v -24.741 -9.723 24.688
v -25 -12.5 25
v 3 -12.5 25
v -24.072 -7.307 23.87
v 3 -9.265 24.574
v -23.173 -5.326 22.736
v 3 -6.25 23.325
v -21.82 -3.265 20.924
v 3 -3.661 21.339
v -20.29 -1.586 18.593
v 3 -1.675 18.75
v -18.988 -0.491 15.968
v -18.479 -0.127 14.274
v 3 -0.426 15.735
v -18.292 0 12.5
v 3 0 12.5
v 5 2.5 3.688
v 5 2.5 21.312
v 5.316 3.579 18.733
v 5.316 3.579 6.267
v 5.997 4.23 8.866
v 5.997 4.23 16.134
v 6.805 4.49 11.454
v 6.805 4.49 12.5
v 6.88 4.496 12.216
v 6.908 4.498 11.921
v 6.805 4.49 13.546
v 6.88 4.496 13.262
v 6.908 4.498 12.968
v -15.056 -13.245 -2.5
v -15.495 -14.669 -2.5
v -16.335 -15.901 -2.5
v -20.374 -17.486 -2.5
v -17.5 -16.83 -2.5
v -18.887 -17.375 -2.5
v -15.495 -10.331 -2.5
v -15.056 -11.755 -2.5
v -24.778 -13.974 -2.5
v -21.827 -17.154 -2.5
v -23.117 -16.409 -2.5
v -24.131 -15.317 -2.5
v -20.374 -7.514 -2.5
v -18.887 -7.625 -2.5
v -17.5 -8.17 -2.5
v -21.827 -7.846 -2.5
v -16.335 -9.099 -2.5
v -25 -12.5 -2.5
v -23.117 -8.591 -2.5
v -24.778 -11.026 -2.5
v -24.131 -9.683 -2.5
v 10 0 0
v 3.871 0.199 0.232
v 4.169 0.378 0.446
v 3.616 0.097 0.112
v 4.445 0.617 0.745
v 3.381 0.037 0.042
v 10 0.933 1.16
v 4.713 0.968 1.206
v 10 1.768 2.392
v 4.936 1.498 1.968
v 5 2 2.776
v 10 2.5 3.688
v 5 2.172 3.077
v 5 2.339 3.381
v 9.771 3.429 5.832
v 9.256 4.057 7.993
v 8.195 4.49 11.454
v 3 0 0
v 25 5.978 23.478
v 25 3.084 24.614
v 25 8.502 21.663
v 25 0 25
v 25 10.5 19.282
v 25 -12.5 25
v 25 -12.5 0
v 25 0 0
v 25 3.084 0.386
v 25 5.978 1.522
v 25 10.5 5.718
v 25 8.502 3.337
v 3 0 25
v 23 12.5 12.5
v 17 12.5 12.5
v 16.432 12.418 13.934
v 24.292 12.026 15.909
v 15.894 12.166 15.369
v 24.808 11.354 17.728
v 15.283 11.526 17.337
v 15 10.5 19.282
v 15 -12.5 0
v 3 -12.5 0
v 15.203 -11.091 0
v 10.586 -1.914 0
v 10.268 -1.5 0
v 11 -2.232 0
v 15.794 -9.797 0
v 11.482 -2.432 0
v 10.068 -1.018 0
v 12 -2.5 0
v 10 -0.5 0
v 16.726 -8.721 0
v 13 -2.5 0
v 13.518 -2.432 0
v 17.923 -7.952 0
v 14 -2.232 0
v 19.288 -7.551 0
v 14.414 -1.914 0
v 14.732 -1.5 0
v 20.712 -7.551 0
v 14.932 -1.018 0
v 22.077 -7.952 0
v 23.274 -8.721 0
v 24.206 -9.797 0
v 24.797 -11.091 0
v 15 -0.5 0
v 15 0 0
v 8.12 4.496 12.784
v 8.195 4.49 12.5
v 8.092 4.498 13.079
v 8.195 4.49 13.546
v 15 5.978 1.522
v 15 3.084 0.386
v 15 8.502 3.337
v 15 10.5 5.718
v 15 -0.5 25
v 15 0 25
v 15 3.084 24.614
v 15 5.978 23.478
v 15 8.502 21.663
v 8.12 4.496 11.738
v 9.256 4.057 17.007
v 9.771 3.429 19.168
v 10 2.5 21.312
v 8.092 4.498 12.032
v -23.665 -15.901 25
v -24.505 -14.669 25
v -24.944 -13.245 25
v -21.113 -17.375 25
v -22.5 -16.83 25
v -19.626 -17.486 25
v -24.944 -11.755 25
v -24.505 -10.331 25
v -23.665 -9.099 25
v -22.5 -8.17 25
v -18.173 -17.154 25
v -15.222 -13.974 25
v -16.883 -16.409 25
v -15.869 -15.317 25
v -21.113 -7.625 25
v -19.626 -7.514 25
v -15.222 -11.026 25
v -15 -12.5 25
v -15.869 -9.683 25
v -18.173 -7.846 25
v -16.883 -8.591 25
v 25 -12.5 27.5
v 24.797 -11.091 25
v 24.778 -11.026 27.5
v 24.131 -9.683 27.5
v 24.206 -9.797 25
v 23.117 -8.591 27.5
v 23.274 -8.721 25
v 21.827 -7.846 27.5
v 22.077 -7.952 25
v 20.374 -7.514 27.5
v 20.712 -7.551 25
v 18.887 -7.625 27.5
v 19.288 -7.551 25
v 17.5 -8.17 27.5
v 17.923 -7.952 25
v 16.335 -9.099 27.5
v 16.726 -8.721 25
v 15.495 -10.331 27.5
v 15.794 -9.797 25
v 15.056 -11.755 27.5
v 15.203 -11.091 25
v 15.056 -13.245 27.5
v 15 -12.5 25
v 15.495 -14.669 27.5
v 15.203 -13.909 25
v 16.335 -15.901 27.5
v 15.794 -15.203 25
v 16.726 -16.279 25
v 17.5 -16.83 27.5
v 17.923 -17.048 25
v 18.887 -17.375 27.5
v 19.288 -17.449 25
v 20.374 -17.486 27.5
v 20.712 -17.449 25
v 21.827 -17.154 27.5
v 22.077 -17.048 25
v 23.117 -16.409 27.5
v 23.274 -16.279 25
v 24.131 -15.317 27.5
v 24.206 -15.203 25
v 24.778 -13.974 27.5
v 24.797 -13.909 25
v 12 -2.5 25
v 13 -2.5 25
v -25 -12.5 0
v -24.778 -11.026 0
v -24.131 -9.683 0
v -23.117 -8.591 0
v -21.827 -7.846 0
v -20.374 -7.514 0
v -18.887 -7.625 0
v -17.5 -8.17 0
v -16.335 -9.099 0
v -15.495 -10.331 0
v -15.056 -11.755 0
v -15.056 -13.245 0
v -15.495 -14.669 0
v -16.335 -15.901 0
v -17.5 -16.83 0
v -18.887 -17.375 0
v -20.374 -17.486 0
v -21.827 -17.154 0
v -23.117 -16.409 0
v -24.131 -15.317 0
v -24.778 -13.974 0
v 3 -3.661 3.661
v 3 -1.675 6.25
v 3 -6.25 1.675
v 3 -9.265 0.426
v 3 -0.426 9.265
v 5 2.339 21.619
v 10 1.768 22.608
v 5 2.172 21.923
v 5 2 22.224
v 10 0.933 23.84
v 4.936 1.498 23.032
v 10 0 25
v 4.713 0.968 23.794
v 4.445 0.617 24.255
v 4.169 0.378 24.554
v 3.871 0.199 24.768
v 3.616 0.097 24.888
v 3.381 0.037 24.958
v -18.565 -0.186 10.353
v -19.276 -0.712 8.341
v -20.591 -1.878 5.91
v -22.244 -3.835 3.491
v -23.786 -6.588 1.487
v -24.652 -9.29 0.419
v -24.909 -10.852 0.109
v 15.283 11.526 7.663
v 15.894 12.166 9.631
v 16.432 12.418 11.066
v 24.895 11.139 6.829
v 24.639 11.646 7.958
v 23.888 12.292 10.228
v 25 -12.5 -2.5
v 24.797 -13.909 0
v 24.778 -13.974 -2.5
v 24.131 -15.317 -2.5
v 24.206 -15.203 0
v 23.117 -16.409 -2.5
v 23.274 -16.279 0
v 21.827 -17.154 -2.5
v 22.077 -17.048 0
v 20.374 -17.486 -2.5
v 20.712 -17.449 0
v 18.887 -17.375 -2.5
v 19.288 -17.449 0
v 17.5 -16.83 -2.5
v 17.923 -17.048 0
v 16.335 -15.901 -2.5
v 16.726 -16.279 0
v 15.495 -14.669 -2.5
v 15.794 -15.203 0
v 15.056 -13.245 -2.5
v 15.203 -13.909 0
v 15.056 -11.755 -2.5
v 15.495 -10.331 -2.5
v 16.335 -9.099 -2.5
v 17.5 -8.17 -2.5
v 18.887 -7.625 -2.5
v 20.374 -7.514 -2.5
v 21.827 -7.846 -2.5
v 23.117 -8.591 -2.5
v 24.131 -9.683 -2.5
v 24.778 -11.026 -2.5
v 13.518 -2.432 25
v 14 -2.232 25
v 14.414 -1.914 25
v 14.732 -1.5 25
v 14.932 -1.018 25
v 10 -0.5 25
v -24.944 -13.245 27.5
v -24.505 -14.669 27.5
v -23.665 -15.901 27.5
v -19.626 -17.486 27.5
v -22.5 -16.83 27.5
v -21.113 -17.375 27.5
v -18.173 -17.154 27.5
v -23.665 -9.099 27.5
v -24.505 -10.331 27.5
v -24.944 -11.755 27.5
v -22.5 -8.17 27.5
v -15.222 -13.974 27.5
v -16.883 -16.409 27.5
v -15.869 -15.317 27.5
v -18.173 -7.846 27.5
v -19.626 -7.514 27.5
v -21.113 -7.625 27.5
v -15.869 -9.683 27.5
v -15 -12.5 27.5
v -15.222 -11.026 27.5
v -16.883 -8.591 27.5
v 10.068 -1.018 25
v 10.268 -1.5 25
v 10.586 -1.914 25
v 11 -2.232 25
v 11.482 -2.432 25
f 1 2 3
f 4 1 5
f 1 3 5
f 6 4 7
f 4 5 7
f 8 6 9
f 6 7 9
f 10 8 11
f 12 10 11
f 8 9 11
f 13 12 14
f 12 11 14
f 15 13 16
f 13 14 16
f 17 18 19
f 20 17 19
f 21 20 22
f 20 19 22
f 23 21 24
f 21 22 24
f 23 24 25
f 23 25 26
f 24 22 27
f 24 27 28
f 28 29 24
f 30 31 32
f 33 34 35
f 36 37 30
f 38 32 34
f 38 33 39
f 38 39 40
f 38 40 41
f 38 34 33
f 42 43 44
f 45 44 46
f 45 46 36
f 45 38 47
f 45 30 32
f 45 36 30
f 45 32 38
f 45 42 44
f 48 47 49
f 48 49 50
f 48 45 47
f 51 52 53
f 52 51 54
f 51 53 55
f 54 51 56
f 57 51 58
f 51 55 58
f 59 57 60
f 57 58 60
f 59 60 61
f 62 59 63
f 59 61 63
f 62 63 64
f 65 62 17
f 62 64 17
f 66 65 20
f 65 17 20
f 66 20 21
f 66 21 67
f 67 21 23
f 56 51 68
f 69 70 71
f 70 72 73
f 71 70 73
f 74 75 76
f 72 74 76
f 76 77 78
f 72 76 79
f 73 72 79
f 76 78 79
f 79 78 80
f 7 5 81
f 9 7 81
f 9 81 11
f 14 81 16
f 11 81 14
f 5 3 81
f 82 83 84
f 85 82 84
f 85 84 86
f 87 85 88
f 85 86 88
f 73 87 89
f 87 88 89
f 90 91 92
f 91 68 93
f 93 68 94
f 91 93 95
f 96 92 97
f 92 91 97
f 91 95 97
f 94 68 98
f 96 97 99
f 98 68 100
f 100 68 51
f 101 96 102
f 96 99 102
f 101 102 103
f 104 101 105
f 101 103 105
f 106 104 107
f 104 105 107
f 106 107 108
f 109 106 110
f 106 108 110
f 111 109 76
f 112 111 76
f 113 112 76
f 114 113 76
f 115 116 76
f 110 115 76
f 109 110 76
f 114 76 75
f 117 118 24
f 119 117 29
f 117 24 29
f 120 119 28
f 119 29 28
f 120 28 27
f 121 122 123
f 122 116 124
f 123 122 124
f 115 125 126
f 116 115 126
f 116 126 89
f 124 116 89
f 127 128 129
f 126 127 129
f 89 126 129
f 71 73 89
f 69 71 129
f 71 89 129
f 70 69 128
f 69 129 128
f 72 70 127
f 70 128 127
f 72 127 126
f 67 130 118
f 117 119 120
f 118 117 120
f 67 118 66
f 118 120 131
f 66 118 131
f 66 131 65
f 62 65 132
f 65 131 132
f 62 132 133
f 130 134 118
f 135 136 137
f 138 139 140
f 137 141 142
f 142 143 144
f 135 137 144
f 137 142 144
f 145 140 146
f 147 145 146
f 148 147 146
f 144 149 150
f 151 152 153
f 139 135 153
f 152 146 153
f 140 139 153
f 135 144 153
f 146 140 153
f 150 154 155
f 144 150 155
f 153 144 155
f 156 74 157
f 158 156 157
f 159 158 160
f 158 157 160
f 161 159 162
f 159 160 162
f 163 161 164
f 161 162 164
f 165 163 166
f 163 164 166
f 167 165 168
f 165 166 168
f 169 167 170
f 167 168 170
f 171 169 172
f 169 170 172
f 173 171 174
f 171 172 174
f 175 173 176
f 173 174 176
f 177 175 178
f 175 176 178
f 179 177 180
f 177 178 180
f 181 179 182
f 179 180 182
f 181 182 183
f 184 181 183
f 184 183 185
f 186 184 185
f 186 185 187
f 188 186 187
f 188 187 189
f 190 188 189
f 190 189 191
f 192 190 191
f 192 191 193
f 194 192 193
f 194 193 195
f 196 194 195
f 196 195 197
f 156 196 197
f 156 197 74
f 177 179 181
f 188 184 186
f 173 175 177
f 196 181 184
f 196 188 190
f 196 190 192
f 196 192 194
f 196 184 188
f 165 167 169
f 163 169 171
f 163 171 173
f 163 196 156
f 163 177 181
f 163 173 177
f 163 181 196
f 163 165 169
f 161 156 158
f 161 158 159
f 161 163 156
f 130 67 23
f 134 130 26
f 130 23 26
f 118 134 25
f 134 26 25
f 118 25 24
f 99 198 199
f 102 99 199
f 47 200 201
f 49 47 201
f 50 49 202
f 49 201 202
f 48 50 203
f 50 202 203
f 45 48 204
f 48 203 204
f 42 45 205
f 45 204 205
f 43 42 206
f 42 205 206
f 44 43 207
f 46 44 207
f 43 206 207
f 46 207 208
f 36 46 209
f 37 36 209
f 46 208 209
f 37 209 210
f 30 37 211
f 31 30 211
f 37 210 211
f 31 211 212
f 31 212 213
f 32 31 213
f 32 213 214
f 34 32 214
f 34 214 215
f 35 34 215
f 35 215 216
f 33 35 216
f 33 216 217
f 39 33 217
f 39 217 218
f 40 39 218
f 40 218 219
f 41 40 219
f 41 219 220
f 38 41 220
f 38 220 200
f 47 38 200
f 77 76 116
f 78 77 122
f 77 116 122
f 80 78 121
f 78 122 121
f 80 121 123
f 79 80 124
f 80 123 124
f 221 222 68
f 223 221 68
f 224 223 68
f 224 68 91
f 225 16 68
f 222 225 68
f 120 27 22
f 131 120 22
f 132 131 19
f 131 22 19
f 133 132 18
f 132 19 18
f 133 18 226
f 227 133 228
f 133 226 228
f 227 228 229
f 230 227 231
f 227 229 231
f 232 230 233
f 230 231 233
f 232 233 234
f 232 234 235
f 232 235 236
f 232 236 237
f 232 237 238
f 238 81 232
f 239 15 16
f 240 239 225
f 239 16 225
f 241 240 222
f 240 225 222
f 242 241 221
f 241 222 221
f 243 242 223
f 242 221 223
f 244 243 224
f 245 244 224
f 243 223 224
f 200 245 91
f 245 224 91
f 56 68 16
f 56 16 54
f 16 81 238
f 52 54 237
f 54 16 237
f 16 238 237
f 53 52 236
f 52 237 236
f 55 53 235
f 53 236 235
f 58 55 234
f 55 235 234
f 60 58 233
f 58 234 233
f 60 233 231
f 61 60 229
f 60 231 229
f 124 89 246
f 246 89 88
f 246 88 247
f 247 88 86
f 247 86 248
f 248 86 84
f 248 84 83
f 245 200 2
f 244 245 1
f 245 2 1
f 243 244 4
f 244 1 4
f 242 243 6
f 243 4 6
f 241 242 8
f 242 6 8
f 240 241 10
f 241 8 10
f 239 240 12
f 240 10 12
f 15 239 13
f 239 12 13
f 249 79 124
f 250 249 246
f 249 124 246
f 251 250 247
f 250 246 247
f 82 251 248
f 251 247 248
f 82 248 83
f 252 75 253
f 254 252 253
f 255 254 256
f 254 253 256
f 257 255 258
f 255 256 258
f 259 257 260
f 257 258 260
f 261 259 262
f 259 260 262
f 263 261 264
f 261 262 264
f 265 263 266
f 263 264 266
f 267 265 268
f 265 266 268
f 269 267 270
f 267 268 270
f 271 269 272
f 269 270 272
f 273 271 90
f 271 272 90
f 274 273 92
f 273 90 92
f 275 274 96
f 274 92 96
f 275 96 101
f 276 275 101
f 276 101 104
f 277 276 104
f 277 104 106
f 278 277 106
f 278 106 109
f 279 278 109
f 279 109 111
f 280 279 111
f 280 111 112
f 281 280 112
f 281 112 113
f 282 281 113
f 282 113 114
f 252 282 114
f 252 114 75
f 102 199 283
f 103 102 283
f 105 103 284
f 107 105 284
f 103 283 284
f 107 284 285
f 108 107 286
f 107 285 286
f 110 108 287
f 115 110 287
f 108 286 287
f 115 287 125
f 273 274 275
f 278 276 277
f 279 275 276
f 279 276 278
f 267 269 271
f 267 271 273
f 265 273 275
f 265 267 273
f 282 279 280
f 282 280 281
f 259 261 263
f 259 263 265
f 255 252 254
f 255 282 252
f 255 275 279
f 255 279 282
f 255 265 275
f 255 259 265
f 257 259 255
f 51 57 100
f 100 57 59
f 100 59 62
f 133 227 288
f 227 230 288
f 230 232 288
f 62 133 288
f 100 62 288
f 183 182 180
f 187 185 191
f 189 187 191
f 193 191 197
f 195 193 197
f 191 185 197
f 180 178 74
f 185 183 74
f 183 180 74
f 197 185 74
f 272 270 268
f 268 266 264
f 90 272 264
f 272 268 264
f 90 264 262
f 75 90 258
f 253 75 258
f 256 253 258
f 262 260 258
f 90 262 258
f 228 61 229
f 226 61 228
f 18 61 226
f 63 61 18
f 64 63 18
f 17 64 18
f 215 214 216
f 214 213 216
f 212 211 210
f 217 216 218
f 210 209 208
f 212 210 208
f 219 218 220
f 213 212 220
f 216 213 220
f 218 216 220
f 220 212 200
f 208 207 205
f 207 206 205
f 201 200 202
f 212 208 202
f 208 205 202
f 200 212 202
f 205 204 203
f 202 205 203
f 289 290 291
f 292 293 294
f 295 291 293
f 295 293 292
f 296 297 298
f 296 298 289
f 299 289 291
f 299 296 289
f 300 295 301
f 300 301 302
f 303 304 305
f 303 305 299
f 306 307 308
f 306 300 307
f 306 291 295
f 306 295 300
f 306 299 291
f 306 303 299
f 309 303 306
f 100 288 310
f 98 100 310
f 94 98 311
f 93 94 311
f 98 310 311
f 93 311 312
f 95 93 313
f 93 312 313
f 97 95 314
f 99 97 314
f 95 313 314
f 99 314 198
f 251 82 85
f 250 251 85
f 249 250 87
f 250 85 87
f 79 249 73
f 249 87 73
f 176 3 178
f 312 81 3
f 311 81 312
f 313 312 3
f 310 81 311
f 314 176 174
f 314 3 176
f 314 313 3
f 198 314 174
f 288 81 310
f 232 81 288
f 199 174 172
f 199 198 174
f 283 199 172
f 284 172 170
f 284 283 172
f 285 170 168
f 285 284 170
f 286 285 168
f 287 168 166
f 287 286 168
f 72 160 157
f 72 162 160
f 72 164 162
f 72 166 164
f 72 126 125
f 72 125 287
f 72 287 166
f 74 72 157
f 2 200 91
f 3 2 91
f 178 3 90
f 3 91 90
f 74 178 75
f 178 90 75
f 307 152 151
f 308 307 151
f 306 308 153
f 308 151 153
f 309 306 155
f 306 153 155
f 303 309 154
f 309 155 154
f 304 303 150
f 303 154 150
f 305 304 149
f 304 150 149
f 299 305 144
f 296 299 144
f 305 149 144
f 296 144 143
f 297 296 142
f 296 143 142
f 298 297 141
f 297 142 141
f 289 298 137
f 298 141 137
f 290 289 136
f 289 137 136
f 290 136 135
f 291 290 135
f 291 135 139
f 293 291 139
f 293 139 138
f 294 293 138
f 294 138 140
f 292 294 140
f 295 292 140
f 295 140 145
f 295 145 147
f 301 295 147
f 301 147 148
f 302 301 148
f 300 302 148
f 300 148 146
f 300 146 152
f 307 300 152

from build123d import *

# Parameters (mm, degrees)
SKETCH1_W               = 50
SKETCH1_H               = 25
BOSS_EXTRUDE1_DEPTH     = 25
CUT_EXTRUDE2_DEPTH      = 25
CUT_EXTRUDE3_DEPTH      = 49.79805324
CUT_EXTRUDE3_DEPTH_BACK = 49.79805324
CUT_EXTRUDE5_DEPTH      = 3
CUT_EXTRUDE5_DEPTH_BACK = 28
CUT_EXTRUDE9_DEPTH      = 7
SKETCH9_R               = 5
BOSS_EXTRUDE2_DEPTH     = 2.5
SKETCH10_R              = 5
BOSS_EXTRUDE3_DEPTH     = 2.5


with BuildPart() as part:
    # Sketch1 → Boss-Extrude1 (new body)
    with BuildSketch(Plane.XY):
        Rectangle(SKETCH1_W, SKETCH1_H)
    extrude(amount=BOSS_EXTRUDE1_DEPTH)

    # Sketch2 → Cut-Extrude2 (cut)
    with BuildSketch(Plane.XY.offset(25)):
        with BuildLine():
            Line((-25, 12.5), (-25, -12.5))
            ThreePointArc((-25, -12.5), (-23.216910184, -5.406814173), (-18.291561976, 0))
            Line((-18.291561976, 0), (3, 0))
            ThreePointArc((3, 0), (4.414213562, 0.585786438), (5, 2))
            Line((5, 2), (5, 2.5))
            ThreePointArc((5, 2.5), (5.585786438, 3.914213562), (7, 4.5))
            Line((7, 4.5), (8, 4.5))
            ThreePointArc((8, 4.5), (9.414213562, 3.914213562), (10, 2.5))
            Line((10, 2.5), (10, -0.5))
            ThreePointArc((10, -0.5), (10.585786438, -1.914213562), (12, -2.5))
            Line((12, -2.5), (13, -2.5))
            ThreePointArc((13, -2.5), (14.414213562, -1.914213562), (15, -0.5))
            Line((15, -0.5), (15, 10.5))
            ThreePointArc((15, 10.5), (15.585786438, 11.914213562), (17, 12.5))
            Line((17, 12.5), (-25, 12.5))
        make_face()
        with BuildLine():
            Line((25, 12.5), (23, 12.5))
            ThreePointArc((23, 12.5), (24.414213562, 11.914213562), (25, 10.5))
            Line((25, 10.5), (25, 12.5))
        make_face()
    extrude(amount=-CUT_EXTRUDE2_DEPTH, mode=Mode.SUBTRACT)

    # Sketch5 → Cut-Extrude3 (cut, two sides)
    with BuildSketch(Plane.ZY.offset(-15)) as cut_extrude3_sk:
        with BuildLine():
            Line((0, 12.5), (0, 10.5))
            Line((0, 10.5), (5.717670017, 10.5))
            ThreePointArc((5.717670017, 10.5), (8.964466094, 11.989578808), (12.5, 12.5))
            Line((12.5, 12.5), (0, 12.5))
        make_face()
        with BuildLine():
            Line((0, 10.5), (0, 0))
            ThreePointArc((0, 0), (1.522087521, 5.977912479), (5.717670017, 10.5))
            Line((5.717670017, 10.5), (0, 10.5))
        make_face()
        with BuildLine():
            ThreePointArc((19.282329983, 10.5), (23.477912479, 5.977912479), (25, 0))
            Line((25, 0), (25, 10.5))
            Line((25, 10.5), (19.282329983, 10.5))
        make_face()
        with BuildLine():
            Line((19.282329983, 10.5), (25, 10.5))
            Line((25, 10.5), (25, 12.5))
            Line((25, 12.5), (12.5, 12.5))
            ThreePointArc((12.5, 12.5), (16.035533906, 11.989578808), (19.282329983, 10.5))
        make_face()
    extrude(amount=CUT_EXTRUDE3_DEPTH, mode=Mode.SUBTRACT)
    extrude(cut_extrude3_sk.sketch, amount=-CUT_EXTRUDE3_DEPTH_BACK, mode=Mode.SUBTRACT)

    # Sketch7 → Cut-Extrude5 (cut, two sides)
    with BuildSketch(Plane(origin=(0, 0, 0), x_dir=(0, 0, -1), z_dir=(1, 0, 0))) as cut_extrude5_sk:
        with BuildLine():
            ThreePointArc((-25, -12.5), (-21.338834788, -3.661165258), (-12.500000066, 0))
            Line((-12.500000066, 0), (-25, 0))
            Line((-25, 0), (-25, -12.5))
        make_face()
        with BuildLine():
            ThreePointArc((-12.500000066, 0), (-3.661165258, -3.661165212), (0, -12.5))
            Line((0, -12.5), (0, 0))
            Line((0, 0), (-12.500000066, 0))
        make_face()
    extrude(amount=CUT_EXTRUDE5_DEPTH, mode=Mode.SUBTRACT)
    extrude(cut_extrude5_sk.sketch, amount=-CUT_EXTRUDE5_DEPTH_BACK, mode=Mode.SUBTRACT)

    # Sketch8 → Cut-Extrude9 (cut)
    with BuildSketch(Plane.ZY.offset(-3)):
        with BuildLine():
            Line((0, 6.612766069), (0, 4.490426703))
            Line((0, 4.490426703), (11.453744839, 4.490426703))
            ThreePointArc((11.453744839, 4.490426703), (11.97687242, 4.497948677), (12.5, 4.490426703))
            Line((12.5, 4.490426703), (12.5, 6.612766069))
            Line((12.5, 6.612766069), (0, 6.612766069))
        make_face()
        with BuildLine():
            Line((0, 4.490426703), (0, 0))
            ThreePointArc((0, 0), (5.335827096, 3.24265383), (11.453744839, 4.490426703))
            Line((11.453744839, 4.490426703), (0, 4.490426703))
        make_face()
        with BuildLine():
            Line((12.5, 6.612766069), (12.5, 4.490426703))
            ThreePointArc((12.5, 4.490426703), (13.02312758, 4.497948677), (13.546255161, 4.490426703))
            Line((13.546255161, 4.490426703), (25, 4.490426703))
            Line((25, 4.490426703), (25, 6.612766069))
            Line((25, 6.612766069), (12.5, 6.612766069))
        make_face()
        with BuildLine():
            ThreePointArc((13.546255161, 4.490426703), (19.664172904, 3.24265383), (25, 0))
            Line((25, 0), (25, 4.490426703))
            Line((25, 4.490426703), (13.546255161, 4.490426703))
        make_face()
    extrude(amount=-CUT_EXTRUDE9_DEPTH, mode=Mode.SUBTRACT)

    # Sketch9 → Boss-Extrude2 (add)
    with BuildSketch(Plane.XY.offset(25)):
        with Locations((-20, -12.5)):
            Circle(SKETCH9_R)
        with Locations((20, -12.5)):
            Circle(SKETCH9_R)
    extrude(amount=BOSS_EXTRUDE2_DEPTH)


with BuildPart() as boss_extrude2_piece_1:
    # of the separate pieces the step leaves, piece 1, a body of its own (boss_extrude2_pieces)
    add(part.part.solids().sort_by_distance((15, 10.5, 5.717670017))[0])

    # Sketch10 → Boss-Extrude3 (add)
    with BuildSketch(Plane(origin=(0, 0, 0), x_dir=(-1, 0, 0), z_dir=(0, 0, -1))):
        with Locations(Location((-20, -12.5, 0), (0, 0, 180))):
            Circle(SKETCH10_R)
        with Locations((20, -12.5)):
            Circle(SKETCH10_R)
    extrude(amount=BOSS_EXTRUDE3_DEPTH)


with BuildPart() as boss_extrude2_piece_2:
    # of the separate pieces the step leaves, piece 2, a body of its own (boss_extrude2_pieces)
    add(part.part.solids().sort_by_distance((-15, -12.5, 27.5))[0])


with BuildPart() as boss_extrude3_piece_1:
    # of the separate pieces the step leaves, piece 1, a body of its own (boss_extrude3_pieces)
    add(boss_extrude2_piece_1.part.solids().sort_by_distance((15, 10.5, 5.717670017))[0])


with BuildPart() as boss_extrude3_piece_2:
    # of the separate pieces the step leaves, piece 2, a body of its own (boss_extrude3_pieces)
    add(boss_extrude2_piece_1.part.solids().sort_by_distance((-25, -12.5, -2.5))[0])


solid = Compound([boss_extrude2_piece_2.part, boss_extrude3_piece_1.part, boss_extrude3_piece_2.part])
